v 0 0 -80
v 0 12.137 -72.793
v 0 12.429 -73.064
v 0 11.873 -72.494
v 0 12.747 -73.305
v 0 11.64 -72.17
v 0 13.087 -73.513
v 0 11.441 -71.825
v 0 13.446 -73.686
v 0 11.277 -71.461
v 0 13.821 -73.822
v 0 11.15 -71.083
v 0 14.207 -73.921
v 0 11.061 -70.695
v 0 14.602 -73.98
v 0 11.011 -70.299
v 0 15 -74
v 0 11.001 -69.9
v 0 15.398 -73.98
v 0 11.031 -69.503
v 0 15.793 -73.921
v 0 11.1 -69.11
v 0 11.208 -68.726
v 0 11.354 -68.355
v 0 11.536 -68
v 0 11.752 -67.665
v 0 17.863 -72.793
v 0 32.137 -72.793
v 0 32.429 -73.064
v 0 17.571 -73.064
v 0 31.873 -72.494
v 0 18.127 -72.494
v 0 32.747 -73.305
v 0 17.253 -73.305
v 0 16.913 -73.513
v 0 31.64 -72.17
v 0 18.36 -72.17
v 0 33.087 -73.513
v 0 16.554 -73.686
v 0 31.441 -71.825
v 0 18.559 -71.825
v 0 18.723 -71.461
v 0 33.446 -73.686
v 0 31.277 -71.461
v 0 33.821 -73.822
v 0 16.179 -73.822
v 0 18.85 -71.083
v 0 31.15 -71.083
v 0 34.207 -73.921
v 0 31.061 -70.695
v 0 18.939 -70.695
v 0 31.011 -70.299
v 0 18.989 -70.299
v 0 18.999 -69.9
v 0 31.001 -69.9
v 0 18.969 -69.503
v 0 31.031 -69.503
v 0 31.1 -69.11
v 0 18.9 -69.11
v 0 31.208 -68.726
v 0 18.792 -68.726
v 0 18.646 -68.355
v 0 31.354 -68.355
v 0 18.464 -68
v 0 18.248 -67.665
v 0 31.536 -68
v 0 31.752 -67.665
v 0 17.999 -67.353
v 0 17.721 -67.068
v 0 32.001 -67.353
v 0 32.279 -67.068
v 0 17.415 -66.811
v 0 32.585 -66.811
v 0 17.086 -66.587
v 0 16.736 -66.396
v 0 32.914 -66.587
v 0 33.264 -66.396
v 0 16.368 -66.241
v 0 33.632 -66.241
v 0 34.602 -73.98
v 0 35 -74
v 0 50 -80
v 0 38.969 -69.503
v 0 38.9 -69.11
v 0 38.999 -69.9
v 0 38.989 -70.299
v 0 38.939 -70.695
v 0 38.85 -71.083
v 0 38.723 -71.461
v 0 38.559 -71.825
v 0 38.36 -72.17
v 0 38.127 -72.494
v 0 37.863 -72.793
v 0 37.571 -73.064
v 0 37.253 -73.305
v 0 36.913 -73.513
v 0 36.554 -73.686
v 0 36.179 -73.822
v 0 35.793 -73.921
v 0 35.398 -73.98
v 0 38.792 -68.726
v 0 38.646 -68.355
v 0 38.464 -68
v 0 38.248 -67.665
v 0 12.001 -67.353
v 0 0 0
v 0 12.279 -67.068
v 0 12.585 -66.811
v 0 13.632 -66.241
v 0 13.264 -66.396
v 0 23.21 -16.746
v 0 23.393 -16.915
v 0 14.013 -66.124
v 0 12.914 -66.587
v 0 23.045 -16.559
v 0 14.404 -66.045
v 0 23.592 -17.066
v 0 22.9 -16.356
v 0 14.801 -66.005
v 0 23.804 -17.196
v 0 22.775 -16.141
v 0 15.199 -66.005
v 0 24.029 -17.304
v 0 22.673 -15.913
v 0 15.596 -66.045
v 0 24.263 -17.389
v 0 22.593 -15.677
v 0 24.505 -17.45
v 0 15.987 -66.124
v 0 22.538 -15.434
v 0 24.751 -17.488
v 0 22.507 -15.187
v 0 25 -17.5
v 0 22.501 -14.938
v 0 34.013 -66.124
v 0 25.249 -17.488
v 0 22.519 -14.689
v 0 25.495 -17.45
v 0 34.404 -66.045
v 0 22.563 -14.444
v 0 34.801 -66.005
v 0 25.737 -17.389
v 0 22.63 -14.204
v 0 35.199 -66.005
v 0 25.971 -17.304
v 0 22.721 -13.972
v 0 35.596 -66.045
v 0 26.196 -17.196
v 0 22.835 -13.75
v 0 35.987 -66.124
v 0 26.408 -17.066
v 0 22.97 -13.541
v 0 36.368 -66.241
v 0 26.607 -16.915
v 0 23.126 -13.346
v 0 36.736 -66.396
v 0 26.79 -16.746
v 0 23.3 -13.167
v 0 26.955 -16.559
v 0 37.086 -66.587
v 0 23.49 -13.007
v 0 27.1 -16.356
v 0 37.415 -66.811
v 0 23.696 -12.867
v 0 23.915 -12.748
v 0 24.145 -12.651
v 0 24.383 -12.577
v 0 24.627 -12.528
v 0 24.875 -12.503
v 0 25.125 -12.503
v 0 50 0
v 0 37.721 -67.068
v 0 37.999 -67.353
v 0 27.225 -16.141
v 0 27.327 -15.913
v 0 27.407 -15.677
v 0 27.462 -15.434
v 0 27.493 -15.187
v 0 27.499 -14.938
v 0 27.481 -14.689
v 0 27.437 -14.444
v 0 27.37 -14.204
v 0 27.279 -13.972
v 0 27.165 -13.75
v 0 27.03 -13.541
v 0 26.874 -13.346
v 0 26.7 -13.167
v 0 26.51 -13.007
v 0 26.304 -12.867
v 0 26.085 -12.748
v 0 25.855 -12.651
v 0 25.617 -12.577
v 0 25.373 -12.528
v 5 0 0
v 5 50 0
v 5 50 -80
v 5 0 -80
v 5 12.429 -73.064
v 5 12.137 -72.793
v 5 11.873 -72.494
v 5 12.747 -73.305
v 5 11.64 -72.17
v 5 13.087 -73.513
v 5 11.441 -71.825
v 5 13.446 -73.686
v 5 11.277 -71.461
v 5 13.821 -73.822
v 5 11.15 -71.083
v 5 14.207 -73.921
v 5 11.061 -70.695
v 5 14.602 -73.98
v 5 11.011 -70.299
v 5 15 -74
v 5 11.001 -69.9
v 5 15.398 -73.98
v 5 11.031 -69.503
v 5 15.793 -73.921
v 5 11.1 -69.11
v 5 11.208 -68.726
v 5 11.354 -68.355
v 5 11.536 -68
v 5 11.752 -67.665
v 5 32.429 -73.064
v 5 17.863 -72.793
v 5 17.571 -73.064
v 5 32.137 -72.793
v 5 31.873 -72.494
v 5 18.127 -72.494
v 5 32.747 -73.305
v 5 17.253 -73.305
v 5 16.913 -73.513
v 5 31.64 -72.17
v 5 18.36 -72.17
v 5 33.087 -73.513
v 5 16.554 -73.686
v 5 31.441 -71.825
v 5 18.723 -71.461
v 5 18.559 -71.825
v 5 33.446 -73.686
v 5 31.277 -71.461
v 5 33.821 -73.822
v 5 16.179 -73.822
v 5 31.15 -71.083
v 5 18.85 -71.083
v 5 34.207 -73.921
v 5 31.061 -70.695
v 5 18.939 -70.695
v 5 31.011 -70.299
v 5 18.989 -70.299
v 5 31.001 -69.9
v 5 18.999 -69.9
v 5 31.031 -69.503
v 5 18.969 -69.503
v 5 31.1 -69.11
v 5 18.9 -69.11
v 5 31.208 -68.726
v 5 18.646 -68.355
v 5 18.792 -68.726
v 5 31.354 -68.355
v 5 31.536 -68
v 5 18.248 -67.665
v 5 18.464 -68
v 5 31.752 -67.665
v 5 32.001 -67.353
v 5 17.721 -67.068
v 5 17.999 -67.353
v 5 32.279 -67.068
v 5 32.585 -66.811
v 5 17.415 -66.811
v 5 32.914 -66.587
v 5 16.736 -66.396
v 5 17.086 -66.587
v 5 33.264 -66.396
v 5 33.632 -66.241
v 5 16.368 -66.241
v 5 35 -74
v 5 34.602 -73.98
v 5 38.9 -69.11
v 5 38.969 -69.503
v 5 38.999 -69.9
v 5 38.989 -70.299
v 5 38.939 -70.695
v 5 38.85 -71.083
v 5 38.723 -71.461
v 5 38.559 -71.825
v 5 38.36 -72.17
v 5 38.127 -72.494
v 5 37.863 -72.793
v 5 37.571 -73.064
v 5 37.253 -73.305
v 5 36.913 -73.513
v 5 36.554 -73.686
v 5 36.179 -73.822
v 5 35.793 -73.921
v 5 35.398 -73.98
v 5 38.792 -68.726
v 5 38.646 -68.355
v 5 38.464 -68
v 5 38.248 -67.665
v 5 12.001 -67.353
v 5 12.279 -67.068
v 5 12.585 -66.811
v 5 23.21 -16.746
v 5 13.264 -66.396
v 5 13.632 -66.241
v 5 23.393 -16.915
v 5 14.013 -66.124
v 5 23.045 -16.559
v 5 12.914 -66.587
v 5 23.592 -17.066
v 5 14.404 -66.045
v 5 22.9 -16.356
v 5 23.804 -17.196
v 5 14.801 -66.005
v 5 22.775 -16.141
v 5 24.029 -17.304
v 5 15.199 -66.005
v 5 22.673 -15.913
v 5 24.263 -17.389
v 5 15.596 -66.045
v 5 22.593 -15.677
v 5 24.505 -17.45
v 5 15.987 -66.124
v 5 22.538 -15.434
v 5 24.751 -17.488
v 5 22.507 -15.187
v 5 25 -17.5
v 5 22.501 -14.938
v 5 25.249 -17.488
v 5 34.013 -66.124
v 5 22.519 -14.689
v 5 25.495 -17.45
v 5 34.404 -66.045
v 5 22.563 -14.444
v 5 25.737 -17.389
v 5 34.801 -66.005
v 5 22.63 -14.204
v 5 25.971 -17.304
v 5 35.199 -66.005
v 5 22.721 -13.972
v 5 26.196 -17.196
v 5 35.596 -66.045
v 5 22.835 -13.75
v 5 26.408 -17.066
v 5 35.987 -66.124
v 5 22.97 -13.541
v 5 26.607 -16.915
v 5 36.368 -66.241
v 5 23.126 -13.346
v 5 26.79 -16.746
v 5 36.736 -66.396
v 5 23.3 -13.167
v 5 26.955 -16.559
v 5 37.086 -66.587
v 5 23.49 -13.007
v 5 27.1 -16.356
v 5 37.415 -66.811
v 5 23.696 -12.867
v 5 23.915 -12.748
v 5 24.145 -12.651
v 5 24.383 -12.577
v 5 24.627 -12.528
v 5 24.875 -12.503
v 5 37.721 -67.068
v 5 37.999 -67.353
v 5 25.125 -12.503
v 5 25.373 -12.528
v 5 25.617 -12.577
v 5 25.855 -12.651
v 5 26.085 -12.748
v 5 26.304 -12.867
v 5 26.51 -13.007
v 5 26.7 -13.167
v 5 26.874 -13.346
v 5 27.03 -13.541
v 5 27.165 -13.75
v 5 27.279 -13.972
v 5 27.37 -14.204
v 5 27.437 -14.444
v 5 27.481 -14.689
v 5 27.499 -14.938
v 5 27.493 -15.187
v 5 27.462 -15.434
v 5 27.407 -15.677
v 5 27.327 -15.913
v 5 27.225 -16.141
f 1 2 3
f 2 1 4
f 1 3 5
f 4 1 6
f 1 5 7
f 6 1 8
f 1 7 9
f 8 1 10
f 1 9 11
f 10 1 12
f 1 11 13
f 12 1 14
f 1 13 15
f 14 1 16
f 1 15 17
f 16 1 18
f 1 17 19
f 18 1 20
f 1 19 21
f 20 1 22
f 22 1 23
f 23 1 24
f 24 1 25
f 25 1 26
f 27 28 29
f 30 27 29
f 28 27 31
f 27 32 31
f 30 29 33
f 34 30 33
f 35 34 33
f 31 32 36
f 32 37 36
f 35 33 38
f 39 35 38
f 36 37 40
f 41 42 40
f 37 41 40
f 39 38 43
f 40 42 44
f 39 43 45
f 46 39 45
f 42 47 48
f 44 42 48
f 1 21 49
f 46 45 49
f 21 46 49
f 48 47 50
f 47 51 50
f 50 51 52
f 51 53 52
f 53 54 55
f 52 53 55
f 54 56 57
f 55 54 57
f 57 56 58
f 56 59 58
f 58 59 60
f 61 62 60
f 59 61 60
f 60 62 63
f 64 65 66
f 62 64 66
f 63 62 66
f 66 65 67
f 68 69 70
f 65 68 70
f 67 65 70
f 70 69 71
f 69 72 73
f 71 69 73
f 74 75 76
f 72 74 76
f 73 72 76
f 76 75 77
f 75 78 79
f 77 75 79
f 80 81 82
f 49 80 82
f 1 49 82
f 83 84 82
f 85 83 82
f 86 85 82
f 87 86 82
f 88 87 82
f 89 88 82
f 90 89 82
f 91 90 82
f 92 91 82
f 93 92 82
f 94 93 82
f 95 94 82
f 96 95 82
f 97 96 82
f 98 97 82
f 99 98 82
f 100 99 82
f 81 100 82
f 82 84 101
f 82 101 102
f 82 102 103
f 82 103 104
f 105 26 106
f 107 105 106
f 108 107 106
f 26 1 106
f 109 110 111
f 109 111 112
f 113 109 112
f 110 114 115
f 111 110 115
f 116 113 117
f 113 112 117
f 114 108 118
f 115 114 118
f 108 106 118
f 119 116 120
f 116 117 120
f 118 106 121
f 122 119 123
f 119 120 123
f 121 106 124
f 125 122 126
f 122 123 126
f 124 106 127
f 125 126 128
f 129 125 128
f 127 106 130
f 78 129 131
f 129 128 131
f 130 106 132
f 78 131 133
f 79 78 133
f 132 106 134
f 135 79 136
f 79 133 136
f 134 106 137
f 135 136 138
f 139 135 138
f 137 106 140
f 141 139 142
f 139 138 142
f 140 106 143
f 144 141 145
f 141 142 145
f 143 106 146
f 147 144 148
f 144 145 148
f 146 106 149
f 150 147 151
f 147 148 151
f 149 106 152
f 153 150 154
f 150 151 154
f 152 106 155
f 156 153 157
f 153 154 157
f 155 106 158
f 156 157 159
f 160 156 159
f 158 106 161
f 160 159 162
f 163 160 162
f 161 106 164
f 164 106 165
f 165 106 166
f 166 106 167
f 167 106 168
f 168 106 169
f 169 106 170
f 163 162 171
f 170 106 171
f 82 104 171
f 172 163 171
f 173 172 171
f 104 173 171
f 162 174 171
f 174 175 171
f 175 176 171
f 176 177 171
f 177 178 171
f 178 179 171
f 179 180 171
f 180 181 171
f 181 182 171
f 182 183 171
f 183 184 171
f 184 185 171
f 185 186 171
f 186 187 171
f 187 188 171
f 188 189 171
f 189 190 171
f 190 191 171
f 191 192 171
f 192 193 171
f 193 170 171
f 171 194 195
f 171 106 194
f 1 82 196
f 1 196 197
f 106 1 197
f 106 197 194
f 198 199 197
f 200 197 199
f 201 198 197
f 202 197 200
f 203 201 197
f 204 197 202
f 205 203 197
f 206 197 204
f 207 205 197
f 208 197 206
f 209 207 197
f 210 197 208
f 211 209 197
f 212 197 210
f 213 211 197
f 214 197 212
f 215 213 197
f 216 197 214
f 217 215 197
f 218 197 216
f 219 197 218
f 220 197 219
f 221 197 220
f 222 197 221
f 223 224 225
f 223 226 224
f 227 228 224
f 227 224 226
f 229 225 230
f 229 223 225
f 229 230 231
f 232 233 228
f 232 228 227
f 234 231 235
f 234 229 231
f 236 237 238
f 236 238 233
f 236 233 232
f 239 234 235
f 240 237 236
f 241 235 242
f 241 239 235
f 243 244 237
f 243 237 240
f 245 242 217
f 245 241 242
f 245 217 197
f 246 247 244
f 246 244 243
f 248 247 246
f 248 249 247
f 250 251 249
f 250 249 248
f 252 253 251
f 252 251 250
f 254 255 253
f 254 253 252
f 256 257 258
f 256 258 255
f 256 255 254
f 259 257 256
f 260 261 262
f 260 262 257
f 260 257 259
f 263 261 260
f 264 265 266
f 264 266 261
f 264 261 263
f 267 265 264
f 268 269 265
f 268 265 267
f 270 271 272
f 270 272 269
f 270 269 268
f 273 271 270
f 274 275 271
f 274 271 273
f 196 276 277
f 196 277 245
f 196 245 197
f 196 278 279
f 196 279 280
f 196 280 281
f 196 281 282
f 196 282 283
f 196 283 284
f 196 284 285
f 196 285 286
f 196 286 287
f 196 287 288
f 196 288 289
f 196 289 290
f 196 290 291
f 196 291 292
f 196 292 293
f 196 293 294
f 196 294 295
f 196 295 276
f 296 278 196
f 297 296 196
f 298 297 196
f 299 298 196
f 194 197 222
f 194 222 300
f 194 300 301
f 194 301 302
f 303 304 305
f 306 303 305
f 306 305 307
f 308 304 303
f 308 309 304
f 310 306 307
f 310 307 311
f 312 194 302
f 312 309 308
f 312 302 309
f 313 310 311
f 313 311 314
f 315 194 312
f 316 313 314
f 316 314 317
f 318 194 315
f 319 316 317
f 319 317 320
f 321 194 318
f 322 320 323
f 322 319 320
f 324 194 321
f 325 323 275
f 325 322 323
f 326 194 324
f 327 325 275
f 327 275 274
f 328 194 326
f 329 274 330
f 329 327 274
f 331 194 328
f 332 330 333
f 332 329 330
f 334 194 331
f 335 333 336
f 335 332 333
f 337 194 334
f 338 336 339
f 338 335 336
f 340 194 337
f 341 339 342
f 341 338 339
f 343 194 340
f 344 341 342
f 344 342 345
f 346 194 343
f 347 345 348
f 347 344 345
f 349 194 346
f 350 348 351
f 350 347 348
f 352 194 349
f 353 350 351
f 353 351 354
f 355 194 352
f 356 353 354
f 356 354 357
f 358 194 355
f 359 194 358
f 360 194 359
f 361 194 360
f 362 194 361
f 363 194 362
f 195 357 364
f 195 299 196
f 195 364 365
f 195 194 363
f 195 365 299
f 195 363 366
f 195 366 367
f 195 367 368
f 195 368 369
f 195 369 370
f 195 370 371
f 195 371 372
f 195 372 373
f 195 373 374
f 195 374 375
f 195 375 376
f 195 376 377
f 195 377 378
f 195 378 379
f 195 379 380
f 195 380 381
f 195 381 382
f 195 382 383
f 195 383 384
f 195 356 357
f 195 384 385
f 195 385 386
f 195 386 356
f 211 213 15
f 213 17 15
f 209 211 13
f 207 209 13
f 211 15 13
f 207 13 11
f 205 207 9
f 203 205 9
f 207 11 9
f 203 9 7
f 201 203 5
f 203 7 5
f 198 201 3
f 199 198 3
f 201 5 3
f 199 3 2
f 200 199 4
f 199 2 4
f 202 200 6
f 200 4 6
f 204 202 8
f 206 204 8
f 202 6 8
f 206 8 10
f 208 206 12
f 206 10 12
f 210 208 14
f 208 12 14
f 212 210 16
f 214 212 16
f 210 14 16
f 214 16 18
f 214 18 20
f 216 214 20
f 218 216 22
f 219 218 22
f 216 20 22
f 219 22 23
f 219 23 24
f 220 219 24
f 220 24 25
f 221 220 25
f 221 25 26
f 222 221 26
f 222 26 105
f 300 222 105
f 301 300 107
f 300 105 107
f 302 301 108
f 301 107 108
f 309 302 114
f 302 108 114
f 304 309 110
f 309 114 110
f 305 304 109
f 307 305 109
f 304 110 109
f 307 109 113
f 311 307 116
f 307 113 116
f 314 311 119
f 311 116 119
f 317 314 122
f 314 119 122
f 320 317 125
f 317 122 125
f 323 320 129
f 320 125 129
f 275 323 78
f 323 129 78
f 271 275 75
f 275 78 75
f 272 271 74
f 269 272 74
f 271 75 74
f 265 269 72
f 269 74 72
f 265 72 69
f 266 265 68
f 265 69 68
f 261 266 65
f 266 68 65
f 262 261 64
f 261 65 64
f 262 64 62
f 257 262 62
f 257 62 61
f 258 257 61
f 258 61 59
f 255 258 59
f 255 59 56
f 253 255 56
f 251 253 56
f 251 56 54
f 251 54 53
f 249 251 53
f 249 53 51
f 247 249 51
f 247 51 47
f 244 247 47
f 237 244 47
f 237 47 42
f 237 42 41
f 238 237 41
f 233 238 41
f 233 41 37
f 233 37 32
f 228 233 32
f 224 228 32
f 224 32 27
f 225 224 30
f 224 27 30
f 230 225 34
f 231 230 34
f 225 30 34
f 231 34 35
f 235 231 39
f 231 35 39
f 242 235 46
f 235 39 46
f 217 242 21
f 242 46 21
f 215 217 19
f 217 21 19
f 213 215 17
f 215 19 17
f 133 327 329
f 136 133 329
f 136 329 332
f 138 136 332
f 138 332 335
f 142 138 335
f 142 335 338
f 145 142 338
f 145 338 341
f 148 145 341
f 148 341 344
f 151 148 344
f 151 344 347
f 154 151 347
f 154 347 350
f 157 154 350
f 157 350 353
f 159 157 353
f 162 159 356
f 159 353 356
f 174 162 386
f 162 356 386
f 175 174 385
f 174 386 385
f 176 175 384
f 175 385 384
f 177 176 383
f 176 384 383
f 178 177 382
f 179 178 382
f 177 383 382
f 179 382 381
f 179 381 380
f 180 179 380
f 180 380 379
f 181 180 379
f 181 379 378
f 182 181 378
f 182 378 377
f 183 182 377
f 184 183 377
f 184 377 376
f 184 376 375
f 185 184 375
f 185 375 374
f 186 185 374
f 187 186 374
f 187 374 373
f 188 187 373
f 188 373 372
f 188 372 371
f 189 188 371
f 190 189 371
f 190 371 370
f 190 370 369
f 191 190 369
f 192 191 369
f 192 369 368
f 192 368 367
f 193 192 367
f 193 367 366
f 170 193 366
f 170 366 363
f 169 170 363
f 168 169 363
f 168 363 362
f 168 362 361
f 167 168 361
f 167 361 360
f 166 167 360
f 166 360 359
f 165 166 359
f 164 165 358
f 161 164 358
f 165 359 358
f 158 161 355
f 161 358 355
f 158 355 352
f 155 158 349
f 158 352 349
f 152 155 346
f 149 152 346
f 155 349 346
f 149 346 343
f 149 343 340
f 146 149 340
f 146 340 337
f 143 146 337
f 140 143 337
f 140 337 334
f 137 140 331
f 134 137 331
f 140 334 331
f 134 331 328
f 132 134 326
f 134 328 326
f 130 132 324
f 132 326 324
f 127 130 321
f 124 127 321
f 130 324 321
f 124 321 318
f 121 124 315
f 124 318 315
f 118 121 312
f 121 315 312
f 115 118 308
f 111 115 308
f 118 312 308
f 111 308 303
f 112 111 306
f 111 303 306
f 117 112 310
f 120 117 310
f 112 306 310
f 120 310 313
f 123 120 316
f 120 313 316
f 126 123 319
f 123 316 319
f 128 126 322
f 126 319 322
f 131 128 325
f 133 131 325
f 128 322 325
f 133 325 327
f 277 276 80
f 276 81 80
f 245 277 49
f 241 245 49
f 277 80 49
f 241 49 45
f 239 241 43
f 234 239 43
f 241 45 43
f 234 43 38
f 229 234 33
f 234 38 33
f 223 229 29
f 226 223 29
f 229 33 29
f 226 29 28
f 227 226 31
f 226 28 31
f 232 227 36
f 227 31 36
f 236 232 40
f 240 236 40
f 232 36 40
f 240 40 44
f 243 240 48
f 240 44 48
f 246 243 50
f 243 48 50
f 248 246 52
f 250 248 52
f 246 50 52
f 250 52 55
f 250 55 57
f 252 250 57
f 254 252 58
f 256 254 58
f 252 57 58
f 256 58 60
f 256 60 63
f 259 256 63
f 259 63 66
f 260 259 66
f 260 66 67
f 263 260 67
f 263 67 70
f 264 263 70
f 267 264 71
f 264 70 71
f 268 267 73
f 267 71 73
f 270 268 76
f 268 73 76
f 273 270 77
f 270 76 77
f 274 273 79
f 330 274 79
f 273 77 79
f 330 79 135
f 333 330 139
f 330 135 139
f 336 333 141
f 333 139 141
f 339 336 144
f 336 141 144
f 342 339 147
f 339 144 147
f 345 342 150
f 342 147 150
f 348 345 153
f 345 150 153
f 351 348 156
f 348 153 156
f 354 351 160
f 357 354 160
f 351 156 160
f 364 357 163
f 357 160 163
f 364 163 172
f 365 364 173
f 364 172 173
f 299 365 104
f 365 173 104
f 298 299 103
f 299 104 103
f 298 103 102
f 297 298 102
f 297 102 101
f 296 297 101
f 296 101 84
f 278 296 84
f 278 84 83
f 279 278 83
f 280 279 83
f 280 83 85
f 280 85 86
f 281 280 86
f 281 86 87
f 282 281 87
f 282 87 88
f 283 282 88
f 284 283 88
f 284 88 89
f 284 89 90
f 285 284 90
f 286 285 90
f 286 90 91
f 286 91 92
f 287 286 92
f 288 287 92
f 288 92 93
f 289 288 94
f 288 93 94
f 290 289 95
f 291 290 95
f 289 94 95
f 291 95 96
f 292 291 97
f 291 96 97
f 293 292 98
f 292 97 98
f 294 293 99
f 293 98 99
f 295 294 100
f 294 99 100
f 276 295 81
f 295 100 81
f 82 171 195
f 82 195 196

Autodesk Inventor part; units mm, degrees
ref_plane "YZ Plane" through (0, 0, 0) normal (1, 0, 0) x (0, 1, 0)
ref_plane "XZ Plane" through (0, 0, 0) normal (0, 1, 0) x (-1, 0, 0)
ref_plane "XY Plane" through (0, 0, 0) normal (0, 0, 1) x (1, 0, 0)
sketch "Skizze1" plane through (0, 0, 0) normal (1, 0, 0) x (0, 1, 0)
  line L0 (0, 0) -> (50, 0)
  line L1 (50, 0) -> (50, -80)
  line L2 (50, -80) -> (0, -80)
  line L3 (0, -80) -> (0, 0)
  dimension "d0" = 50
  dimension "d1" = 80
extrude "Extrusion1" add sketch "Skizze1" along normal blind 5
sketch "Skizze2" plane through (5, 0, 0) normal (1, 0, 0) x (0, 0, -1)
  line L0 (0, 0) -> (80, 0) projected
  line L1 (80, 0) -> (70, 0)
  line L2 (70, 0) -> (70, 15)
  line L3 (70, 15) -> (70, 35)
  line L4 (70, 35) -> (70, 50)
  dimension "d4" = 10
  dimension "d5" = 15
  dimension "d6" = 20
  dimension "d7" = 15
hole "Bohrung1" at (5, 35, -70) at (5, 15, -70) direction (-1, 0, 0) diameter 8 depth 8 tip angle 118
sketch "Skizze3" plane through (5, 0, 0) normal (1, 0, 0) x (0, 0, -1)
  line L0 (0, 0) -> (0, 25)
  line L1 (0, 50) -> (0, 0) projected
  line L2 (0, 25) -> (15, 25)
  circle A0 centre (15, 25) radius 2.5
  dimension "d15" = 25
  dimension "d16" = 15
  dimension "d17" = 5
extrude "Extrusion2" cut sketch "Skizze3" against normal blind 10
properties part number "Stuetzplatte"
